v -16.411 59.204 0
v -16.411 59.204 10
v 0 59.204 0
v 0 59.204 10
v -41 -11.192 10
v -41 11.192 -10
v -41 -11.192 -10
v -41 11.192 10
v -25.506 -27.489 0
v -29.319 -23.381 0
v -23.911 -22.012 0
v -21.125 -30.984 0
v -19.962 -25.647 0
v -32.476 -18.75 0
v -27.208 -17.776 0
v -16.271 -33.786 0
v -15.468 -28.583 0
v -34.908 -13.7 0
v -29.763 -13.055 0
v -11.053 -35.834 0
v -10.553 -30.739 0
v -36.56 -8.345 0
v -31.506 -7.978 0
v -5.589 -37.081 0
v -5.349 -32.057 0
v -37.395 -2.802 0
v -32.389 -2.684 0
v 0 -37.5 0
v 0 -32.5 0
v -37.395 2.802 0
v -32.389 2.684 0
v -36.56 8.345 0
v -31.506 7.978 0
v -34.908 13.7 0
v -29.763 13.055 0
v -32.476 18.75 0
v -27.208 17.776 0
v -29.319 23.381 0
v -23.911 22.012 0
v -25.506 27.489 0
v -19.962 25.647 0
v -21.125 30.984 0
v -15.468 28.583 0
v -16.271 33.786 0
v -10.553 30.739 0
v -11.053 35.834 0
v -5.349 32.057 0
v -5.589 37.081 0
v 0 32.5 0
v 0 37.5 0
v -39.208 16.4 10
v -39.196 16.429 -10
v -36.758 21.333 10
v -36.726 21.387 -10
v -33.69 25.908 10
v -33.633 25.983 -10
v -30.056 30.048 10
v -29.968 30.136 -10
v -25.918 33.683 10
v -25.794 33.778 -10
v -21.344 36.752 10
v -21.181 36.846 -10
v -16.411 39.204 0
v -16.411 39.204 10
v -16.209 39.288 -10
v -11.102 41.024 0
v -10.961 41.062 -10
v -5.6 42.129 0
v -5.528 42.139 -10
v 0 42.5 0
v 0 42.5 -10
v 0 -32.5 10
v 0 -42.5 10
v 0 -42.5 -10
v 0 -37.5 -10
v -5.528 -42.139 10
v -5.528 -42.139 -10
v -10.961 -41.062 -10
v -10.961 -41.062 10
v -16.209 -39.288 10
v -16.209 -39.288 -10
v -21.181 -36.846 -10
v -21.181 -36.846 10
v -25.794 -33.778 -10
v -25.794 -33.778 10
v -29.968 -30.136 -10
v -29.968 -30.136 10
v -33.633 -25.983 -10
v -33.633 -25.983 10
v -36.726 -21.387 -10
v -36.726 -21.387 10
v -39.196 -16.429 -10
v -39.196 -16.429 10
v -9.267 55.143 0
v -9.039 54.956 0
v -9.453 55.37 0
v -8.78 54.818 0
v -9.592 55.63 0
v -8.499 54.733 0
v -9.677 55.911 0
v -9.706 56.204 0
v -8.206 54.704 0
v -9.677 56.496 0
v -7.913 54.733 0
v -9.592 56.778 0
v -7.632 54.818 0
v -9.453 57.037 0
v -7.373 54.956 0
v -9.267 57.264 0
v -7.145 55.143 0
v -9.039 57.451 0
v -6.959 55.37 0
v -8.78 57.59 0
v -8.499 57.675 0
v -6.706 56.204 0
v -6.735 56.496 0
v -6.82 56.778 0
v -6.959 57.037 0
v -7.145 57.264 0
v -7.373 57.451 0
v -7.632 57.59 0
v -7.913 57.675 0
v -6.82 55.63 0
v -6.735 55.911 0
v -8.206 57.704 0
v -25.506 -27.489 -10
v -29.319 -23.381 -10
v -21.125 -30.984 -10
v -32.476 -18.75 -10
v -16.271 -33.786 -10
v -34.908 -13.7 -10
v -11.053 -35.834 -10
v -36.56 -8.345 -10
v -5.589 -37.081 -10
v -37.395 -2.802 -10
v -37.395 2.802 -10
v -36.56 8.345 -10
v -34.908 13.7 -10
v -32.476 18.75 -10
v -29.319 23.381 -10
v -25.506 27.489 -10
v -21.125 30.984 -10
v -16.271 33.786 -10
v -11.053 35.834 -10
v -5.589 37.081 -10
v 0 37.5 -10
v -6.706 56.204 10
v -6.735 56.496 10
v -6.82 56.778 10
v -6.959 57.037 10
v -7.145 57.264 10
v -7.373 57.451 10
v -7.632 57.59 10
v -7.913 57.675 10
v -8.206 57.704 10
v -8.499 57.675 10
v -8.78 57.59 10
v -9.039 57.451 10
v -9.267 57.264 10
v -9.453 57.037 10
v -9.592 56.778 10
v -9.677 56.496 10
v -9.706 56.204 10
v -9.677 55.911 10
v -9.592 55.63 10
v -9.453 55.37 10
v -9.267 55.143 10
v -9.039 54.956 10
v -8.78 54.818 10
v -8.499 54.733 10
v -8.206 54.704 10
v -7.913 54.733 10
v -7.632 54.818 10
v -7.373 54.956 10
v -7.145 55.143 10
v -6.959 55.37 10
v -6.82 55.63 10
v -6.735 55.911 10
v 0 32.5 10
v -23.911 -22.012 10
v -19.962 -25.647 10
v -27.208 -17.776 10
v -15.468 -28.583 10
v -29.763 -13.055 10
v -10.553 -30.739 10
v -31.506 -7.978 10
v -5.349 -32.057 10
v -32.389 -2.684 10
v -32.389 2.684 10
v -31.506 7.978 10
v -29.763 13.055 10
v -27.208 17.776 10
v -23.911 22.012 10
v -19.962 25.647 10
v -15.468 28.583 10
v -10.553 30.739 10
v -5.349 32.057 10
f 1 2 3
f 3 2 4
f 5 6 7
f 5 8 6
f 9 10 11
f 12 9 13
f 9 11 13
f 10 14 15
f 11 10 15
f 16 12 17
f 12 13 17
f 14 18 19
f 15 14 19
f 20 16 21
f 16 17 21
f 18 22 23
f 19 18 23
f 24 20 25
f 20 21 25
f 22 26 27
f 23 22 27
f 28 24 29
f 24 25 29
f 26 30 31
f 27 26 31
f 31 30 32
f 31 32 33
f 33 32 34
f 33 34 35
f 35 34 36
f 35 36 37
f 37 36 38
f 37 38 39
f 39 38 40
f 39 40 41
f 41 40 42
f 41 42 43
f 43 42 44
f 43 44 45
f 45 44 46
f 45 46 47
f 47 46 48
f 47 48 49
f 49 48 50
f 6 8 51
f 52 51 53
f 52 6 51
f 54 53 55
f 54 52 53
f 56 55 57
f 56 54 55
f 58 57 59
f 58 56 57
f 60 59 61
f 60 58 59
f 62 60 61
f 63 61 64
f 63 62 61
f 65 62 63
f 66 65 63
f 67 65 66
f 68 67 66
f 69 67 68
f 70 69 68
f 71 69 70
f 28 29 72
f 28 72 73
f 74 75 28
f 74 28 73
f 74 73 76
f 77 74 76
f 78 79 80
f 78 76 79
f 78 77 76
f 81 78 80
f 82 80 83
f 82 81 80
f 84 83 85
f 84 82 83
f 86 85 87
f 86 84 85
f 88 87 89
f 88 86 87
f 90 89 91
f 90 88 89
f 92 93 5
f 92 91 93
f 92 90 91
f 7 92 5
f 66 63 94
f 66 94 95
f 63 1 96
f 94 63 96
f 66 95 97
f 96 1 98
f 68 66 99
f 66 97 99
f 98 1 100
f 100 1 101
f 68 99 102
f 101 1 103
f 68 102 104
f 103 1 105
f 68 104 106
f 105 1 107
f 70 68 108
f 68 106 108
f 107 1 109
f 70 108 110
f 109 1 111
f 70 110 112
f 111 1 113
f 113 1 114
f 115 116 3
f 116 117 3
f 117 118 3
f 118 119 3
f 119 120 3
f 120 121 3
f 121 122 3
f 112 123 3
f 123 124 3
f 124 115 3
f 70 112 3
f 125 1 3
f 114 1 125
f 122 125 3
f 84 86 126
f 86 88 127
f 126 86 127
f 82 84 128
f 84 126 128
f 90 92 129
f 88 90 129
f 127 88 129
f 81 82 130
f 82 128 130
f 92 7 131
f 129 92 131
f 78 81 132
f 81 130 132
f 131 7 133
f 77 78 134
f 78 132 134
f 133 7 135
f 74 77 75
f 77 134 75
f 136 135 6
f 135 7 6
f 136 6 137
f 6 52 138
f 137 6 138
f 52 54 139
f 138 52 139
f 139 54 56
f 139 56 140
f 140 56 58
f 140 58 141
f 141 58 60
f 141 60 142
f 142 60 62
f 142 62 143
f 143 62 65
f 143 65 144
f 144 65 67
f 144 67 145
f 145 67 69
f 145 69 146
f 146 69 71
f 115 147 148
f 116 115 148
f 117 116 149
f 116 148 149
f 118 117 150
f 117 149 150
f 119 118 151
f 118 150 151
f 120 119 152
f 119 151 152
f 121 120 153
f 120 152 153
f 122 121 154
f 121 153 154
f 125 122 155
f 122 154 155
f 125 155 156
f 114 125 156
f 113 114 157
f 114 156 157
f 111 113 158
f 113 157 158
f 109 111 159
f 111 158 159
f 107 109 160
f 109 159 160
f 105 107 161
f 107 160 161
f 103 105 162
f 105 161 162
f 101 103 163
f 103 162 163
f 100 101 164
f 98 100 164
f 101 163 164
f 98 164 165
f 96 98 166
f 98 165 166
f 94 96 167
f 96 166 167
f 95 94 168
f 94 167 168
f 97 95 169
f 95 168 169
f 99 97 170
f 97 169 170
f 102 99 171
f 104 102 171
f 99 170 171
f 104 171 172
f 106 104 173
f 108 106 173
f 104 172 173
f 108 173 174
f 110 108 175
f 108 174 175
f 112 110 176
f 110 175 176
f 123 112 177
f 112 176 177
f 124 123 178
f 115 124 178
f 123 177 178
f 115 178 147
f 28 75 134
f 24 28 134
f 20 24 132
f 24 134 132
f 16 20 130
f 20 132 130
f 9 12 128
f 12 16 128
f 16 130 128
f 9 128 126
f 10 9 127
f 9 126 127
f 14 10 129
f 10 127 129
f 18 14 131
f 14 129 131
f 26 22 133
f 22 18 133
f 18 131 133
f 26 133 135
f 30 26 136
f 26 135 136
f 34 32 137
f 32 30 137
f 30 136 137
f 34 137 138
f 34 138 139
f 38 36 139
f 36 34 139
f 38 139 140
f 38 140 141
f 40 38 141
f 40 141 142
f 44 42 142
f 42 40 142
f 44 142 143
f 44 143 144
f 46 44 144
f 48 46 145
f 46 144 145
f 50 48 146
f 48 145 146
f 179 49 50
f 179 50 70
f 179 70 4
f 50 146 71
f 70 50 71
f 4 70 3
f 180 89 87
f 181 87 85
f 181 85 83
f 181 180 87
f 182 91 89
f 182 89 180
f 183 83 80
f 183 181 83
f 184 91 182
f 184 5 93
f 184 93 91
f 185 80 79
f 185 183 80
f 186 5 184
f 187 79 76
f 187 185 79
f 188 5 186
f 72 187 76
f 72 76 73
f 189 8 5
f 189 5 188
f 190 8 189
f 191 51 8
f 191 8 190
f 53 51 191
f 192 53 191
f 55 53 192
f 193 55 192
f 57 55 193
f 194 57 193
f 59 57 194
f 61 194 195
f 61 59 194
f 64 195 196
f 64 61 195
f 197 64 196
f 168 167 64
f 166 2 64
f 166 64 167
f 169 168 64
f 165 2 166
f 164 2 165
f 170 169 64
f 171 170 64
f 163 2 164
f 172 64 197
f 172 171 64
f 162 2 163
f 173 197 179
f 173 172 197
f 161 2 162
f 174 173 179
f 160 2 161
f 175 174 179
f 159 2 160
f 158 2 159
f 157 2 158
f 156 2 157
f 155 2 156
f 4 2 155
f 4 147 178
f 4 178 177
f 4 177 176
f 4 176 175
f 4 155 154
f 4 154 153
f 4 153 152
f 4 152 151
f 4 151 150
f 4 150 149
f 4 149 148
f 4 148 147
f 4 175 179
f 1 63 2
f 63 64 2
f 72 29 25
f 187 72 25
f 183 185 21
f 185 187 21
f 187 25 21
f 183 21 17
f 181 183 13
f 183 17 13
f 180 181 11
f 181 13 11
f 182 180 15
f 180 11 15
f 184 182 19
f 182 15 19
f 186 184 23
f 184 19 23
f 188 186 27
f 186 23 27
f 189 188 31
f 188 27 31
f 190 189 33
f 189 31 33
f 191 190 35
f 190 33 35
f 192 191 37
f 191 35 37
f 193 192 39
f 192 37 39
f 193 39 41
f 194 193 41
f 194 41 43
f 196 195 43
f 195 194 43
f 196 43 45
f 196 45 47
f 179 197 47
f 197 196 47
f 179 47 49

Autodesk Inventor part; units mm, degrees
ref_plane "YZ Plane" through (0, 0, 0) normal (1, 0, 0) x (0, 1, 0)
ref_plane "XZ Plane" through (0, 0, 0) normal (0, 1, 0) x (-1, 0, 0)
ref_plane "XY Plane" through (0, 0, 0) normal (0, 0, 1) x (1, 0, 0)
sketch "草圖1" plane through (0, 0, 0) normal (0, 0, 1) x (1, 0, 0)
  arc A0 (0, 32.5) -> (0, -32.5) centre (0, 0) ccw
  arc A1 (0, 37.5) -> (0, -37.5) centre (0, 0) ccw
  arc A2 (0, 42.5) -> (0, -42.5) centre (0, 0) ccw
  line L0 (0, 0) -> (0, -59.8463)
  line L1 (0, -59.8463) -> (0, 72.1748)
  point P0 (0, -37.5)
  point P1 (0, -42.5)
  dimension "d16" = 32.5
  dimension "d17" = 37.5
  dimension "d18" = 42.5
extrude "擠出1" add sketch "草圖1" along normal blind 10 contours A0 L0 A1 L1
extrude "擠出2" add sketch "草圖1" along normal mid plane 20 contours A1 L0 A2 L1
sketch "草圖2" plane through (0, 0, 10) normal (0, 0, 1) x (1, 0, 0)
  line L0 (0, 32.5) -> (0, 42.5) projected
  line L1 (0, 42.5) -> (0, 52.5)
  arc A0 (0, 42.5) -> (0, -42.5) centre (0, 0) ccw projected
  line L2 (-16.411, 39.2037) -> (-16.411, 59.2037)
  line L3 (-16.411, 59.2037) -> (0, 59.2037)
  line L4 (0, 59.2037) -> (0, 42.5)
  dimension "d4" = 10
  dimension "d9" = 20
  dimension "d13" = 16.411
extrude "擠出3" add sketch "草圖2" against normal blind 10
sketch "草圖4" plane through (0, 0, 10) normal (0, 0, 1) x (1, 0, 0)
  line L0 (0, 59.2037) -> (0, 37.5) projected
  line L1 (-16.411, 59.2037) -> (-16.411, 39.2037) projected
  line L2 (-16.411, 59.2037) -> (-8.206, 59.2037)
  line L3 (-8.206, 59.2037) -> (-8.206, 56.2037)
  circle A0 centre (-8.206, 56.2037) radius 1.5
  point P0 (0, 0)
  dimension "d21" = 8.205
  dimension "d22" = 3
  dimension "d23" = 3
extrude "擠出4" cut sketch "草圖4" against normal blind 20
sketch "草圖5" plane through (0, 0, 10) normal (0, 0, 1) x (1, 0, 0)
  line L0 (-54.3449, 0) -> (9.0575, 0) construction
  line L1 (0, -52.5) -> (0, 52.5) construction
  line L2 (-45.2874, 15) -> (-41, 15)
  line L3 (-41, 15) -> (-41, -15)
  line L4 (-41, -15) -> (-45.2874, -15)
  line L5 (-45.2874, -15) -> (-45.2874, 15)
  point P0 (0, 0)
  dimension "d24" = 15
  dimension "d25" = 15
  dimension "d26" = 41
extrude "擠出5" cut sketch "草圖5" against normal blind 28
properties part number "ARMR"
